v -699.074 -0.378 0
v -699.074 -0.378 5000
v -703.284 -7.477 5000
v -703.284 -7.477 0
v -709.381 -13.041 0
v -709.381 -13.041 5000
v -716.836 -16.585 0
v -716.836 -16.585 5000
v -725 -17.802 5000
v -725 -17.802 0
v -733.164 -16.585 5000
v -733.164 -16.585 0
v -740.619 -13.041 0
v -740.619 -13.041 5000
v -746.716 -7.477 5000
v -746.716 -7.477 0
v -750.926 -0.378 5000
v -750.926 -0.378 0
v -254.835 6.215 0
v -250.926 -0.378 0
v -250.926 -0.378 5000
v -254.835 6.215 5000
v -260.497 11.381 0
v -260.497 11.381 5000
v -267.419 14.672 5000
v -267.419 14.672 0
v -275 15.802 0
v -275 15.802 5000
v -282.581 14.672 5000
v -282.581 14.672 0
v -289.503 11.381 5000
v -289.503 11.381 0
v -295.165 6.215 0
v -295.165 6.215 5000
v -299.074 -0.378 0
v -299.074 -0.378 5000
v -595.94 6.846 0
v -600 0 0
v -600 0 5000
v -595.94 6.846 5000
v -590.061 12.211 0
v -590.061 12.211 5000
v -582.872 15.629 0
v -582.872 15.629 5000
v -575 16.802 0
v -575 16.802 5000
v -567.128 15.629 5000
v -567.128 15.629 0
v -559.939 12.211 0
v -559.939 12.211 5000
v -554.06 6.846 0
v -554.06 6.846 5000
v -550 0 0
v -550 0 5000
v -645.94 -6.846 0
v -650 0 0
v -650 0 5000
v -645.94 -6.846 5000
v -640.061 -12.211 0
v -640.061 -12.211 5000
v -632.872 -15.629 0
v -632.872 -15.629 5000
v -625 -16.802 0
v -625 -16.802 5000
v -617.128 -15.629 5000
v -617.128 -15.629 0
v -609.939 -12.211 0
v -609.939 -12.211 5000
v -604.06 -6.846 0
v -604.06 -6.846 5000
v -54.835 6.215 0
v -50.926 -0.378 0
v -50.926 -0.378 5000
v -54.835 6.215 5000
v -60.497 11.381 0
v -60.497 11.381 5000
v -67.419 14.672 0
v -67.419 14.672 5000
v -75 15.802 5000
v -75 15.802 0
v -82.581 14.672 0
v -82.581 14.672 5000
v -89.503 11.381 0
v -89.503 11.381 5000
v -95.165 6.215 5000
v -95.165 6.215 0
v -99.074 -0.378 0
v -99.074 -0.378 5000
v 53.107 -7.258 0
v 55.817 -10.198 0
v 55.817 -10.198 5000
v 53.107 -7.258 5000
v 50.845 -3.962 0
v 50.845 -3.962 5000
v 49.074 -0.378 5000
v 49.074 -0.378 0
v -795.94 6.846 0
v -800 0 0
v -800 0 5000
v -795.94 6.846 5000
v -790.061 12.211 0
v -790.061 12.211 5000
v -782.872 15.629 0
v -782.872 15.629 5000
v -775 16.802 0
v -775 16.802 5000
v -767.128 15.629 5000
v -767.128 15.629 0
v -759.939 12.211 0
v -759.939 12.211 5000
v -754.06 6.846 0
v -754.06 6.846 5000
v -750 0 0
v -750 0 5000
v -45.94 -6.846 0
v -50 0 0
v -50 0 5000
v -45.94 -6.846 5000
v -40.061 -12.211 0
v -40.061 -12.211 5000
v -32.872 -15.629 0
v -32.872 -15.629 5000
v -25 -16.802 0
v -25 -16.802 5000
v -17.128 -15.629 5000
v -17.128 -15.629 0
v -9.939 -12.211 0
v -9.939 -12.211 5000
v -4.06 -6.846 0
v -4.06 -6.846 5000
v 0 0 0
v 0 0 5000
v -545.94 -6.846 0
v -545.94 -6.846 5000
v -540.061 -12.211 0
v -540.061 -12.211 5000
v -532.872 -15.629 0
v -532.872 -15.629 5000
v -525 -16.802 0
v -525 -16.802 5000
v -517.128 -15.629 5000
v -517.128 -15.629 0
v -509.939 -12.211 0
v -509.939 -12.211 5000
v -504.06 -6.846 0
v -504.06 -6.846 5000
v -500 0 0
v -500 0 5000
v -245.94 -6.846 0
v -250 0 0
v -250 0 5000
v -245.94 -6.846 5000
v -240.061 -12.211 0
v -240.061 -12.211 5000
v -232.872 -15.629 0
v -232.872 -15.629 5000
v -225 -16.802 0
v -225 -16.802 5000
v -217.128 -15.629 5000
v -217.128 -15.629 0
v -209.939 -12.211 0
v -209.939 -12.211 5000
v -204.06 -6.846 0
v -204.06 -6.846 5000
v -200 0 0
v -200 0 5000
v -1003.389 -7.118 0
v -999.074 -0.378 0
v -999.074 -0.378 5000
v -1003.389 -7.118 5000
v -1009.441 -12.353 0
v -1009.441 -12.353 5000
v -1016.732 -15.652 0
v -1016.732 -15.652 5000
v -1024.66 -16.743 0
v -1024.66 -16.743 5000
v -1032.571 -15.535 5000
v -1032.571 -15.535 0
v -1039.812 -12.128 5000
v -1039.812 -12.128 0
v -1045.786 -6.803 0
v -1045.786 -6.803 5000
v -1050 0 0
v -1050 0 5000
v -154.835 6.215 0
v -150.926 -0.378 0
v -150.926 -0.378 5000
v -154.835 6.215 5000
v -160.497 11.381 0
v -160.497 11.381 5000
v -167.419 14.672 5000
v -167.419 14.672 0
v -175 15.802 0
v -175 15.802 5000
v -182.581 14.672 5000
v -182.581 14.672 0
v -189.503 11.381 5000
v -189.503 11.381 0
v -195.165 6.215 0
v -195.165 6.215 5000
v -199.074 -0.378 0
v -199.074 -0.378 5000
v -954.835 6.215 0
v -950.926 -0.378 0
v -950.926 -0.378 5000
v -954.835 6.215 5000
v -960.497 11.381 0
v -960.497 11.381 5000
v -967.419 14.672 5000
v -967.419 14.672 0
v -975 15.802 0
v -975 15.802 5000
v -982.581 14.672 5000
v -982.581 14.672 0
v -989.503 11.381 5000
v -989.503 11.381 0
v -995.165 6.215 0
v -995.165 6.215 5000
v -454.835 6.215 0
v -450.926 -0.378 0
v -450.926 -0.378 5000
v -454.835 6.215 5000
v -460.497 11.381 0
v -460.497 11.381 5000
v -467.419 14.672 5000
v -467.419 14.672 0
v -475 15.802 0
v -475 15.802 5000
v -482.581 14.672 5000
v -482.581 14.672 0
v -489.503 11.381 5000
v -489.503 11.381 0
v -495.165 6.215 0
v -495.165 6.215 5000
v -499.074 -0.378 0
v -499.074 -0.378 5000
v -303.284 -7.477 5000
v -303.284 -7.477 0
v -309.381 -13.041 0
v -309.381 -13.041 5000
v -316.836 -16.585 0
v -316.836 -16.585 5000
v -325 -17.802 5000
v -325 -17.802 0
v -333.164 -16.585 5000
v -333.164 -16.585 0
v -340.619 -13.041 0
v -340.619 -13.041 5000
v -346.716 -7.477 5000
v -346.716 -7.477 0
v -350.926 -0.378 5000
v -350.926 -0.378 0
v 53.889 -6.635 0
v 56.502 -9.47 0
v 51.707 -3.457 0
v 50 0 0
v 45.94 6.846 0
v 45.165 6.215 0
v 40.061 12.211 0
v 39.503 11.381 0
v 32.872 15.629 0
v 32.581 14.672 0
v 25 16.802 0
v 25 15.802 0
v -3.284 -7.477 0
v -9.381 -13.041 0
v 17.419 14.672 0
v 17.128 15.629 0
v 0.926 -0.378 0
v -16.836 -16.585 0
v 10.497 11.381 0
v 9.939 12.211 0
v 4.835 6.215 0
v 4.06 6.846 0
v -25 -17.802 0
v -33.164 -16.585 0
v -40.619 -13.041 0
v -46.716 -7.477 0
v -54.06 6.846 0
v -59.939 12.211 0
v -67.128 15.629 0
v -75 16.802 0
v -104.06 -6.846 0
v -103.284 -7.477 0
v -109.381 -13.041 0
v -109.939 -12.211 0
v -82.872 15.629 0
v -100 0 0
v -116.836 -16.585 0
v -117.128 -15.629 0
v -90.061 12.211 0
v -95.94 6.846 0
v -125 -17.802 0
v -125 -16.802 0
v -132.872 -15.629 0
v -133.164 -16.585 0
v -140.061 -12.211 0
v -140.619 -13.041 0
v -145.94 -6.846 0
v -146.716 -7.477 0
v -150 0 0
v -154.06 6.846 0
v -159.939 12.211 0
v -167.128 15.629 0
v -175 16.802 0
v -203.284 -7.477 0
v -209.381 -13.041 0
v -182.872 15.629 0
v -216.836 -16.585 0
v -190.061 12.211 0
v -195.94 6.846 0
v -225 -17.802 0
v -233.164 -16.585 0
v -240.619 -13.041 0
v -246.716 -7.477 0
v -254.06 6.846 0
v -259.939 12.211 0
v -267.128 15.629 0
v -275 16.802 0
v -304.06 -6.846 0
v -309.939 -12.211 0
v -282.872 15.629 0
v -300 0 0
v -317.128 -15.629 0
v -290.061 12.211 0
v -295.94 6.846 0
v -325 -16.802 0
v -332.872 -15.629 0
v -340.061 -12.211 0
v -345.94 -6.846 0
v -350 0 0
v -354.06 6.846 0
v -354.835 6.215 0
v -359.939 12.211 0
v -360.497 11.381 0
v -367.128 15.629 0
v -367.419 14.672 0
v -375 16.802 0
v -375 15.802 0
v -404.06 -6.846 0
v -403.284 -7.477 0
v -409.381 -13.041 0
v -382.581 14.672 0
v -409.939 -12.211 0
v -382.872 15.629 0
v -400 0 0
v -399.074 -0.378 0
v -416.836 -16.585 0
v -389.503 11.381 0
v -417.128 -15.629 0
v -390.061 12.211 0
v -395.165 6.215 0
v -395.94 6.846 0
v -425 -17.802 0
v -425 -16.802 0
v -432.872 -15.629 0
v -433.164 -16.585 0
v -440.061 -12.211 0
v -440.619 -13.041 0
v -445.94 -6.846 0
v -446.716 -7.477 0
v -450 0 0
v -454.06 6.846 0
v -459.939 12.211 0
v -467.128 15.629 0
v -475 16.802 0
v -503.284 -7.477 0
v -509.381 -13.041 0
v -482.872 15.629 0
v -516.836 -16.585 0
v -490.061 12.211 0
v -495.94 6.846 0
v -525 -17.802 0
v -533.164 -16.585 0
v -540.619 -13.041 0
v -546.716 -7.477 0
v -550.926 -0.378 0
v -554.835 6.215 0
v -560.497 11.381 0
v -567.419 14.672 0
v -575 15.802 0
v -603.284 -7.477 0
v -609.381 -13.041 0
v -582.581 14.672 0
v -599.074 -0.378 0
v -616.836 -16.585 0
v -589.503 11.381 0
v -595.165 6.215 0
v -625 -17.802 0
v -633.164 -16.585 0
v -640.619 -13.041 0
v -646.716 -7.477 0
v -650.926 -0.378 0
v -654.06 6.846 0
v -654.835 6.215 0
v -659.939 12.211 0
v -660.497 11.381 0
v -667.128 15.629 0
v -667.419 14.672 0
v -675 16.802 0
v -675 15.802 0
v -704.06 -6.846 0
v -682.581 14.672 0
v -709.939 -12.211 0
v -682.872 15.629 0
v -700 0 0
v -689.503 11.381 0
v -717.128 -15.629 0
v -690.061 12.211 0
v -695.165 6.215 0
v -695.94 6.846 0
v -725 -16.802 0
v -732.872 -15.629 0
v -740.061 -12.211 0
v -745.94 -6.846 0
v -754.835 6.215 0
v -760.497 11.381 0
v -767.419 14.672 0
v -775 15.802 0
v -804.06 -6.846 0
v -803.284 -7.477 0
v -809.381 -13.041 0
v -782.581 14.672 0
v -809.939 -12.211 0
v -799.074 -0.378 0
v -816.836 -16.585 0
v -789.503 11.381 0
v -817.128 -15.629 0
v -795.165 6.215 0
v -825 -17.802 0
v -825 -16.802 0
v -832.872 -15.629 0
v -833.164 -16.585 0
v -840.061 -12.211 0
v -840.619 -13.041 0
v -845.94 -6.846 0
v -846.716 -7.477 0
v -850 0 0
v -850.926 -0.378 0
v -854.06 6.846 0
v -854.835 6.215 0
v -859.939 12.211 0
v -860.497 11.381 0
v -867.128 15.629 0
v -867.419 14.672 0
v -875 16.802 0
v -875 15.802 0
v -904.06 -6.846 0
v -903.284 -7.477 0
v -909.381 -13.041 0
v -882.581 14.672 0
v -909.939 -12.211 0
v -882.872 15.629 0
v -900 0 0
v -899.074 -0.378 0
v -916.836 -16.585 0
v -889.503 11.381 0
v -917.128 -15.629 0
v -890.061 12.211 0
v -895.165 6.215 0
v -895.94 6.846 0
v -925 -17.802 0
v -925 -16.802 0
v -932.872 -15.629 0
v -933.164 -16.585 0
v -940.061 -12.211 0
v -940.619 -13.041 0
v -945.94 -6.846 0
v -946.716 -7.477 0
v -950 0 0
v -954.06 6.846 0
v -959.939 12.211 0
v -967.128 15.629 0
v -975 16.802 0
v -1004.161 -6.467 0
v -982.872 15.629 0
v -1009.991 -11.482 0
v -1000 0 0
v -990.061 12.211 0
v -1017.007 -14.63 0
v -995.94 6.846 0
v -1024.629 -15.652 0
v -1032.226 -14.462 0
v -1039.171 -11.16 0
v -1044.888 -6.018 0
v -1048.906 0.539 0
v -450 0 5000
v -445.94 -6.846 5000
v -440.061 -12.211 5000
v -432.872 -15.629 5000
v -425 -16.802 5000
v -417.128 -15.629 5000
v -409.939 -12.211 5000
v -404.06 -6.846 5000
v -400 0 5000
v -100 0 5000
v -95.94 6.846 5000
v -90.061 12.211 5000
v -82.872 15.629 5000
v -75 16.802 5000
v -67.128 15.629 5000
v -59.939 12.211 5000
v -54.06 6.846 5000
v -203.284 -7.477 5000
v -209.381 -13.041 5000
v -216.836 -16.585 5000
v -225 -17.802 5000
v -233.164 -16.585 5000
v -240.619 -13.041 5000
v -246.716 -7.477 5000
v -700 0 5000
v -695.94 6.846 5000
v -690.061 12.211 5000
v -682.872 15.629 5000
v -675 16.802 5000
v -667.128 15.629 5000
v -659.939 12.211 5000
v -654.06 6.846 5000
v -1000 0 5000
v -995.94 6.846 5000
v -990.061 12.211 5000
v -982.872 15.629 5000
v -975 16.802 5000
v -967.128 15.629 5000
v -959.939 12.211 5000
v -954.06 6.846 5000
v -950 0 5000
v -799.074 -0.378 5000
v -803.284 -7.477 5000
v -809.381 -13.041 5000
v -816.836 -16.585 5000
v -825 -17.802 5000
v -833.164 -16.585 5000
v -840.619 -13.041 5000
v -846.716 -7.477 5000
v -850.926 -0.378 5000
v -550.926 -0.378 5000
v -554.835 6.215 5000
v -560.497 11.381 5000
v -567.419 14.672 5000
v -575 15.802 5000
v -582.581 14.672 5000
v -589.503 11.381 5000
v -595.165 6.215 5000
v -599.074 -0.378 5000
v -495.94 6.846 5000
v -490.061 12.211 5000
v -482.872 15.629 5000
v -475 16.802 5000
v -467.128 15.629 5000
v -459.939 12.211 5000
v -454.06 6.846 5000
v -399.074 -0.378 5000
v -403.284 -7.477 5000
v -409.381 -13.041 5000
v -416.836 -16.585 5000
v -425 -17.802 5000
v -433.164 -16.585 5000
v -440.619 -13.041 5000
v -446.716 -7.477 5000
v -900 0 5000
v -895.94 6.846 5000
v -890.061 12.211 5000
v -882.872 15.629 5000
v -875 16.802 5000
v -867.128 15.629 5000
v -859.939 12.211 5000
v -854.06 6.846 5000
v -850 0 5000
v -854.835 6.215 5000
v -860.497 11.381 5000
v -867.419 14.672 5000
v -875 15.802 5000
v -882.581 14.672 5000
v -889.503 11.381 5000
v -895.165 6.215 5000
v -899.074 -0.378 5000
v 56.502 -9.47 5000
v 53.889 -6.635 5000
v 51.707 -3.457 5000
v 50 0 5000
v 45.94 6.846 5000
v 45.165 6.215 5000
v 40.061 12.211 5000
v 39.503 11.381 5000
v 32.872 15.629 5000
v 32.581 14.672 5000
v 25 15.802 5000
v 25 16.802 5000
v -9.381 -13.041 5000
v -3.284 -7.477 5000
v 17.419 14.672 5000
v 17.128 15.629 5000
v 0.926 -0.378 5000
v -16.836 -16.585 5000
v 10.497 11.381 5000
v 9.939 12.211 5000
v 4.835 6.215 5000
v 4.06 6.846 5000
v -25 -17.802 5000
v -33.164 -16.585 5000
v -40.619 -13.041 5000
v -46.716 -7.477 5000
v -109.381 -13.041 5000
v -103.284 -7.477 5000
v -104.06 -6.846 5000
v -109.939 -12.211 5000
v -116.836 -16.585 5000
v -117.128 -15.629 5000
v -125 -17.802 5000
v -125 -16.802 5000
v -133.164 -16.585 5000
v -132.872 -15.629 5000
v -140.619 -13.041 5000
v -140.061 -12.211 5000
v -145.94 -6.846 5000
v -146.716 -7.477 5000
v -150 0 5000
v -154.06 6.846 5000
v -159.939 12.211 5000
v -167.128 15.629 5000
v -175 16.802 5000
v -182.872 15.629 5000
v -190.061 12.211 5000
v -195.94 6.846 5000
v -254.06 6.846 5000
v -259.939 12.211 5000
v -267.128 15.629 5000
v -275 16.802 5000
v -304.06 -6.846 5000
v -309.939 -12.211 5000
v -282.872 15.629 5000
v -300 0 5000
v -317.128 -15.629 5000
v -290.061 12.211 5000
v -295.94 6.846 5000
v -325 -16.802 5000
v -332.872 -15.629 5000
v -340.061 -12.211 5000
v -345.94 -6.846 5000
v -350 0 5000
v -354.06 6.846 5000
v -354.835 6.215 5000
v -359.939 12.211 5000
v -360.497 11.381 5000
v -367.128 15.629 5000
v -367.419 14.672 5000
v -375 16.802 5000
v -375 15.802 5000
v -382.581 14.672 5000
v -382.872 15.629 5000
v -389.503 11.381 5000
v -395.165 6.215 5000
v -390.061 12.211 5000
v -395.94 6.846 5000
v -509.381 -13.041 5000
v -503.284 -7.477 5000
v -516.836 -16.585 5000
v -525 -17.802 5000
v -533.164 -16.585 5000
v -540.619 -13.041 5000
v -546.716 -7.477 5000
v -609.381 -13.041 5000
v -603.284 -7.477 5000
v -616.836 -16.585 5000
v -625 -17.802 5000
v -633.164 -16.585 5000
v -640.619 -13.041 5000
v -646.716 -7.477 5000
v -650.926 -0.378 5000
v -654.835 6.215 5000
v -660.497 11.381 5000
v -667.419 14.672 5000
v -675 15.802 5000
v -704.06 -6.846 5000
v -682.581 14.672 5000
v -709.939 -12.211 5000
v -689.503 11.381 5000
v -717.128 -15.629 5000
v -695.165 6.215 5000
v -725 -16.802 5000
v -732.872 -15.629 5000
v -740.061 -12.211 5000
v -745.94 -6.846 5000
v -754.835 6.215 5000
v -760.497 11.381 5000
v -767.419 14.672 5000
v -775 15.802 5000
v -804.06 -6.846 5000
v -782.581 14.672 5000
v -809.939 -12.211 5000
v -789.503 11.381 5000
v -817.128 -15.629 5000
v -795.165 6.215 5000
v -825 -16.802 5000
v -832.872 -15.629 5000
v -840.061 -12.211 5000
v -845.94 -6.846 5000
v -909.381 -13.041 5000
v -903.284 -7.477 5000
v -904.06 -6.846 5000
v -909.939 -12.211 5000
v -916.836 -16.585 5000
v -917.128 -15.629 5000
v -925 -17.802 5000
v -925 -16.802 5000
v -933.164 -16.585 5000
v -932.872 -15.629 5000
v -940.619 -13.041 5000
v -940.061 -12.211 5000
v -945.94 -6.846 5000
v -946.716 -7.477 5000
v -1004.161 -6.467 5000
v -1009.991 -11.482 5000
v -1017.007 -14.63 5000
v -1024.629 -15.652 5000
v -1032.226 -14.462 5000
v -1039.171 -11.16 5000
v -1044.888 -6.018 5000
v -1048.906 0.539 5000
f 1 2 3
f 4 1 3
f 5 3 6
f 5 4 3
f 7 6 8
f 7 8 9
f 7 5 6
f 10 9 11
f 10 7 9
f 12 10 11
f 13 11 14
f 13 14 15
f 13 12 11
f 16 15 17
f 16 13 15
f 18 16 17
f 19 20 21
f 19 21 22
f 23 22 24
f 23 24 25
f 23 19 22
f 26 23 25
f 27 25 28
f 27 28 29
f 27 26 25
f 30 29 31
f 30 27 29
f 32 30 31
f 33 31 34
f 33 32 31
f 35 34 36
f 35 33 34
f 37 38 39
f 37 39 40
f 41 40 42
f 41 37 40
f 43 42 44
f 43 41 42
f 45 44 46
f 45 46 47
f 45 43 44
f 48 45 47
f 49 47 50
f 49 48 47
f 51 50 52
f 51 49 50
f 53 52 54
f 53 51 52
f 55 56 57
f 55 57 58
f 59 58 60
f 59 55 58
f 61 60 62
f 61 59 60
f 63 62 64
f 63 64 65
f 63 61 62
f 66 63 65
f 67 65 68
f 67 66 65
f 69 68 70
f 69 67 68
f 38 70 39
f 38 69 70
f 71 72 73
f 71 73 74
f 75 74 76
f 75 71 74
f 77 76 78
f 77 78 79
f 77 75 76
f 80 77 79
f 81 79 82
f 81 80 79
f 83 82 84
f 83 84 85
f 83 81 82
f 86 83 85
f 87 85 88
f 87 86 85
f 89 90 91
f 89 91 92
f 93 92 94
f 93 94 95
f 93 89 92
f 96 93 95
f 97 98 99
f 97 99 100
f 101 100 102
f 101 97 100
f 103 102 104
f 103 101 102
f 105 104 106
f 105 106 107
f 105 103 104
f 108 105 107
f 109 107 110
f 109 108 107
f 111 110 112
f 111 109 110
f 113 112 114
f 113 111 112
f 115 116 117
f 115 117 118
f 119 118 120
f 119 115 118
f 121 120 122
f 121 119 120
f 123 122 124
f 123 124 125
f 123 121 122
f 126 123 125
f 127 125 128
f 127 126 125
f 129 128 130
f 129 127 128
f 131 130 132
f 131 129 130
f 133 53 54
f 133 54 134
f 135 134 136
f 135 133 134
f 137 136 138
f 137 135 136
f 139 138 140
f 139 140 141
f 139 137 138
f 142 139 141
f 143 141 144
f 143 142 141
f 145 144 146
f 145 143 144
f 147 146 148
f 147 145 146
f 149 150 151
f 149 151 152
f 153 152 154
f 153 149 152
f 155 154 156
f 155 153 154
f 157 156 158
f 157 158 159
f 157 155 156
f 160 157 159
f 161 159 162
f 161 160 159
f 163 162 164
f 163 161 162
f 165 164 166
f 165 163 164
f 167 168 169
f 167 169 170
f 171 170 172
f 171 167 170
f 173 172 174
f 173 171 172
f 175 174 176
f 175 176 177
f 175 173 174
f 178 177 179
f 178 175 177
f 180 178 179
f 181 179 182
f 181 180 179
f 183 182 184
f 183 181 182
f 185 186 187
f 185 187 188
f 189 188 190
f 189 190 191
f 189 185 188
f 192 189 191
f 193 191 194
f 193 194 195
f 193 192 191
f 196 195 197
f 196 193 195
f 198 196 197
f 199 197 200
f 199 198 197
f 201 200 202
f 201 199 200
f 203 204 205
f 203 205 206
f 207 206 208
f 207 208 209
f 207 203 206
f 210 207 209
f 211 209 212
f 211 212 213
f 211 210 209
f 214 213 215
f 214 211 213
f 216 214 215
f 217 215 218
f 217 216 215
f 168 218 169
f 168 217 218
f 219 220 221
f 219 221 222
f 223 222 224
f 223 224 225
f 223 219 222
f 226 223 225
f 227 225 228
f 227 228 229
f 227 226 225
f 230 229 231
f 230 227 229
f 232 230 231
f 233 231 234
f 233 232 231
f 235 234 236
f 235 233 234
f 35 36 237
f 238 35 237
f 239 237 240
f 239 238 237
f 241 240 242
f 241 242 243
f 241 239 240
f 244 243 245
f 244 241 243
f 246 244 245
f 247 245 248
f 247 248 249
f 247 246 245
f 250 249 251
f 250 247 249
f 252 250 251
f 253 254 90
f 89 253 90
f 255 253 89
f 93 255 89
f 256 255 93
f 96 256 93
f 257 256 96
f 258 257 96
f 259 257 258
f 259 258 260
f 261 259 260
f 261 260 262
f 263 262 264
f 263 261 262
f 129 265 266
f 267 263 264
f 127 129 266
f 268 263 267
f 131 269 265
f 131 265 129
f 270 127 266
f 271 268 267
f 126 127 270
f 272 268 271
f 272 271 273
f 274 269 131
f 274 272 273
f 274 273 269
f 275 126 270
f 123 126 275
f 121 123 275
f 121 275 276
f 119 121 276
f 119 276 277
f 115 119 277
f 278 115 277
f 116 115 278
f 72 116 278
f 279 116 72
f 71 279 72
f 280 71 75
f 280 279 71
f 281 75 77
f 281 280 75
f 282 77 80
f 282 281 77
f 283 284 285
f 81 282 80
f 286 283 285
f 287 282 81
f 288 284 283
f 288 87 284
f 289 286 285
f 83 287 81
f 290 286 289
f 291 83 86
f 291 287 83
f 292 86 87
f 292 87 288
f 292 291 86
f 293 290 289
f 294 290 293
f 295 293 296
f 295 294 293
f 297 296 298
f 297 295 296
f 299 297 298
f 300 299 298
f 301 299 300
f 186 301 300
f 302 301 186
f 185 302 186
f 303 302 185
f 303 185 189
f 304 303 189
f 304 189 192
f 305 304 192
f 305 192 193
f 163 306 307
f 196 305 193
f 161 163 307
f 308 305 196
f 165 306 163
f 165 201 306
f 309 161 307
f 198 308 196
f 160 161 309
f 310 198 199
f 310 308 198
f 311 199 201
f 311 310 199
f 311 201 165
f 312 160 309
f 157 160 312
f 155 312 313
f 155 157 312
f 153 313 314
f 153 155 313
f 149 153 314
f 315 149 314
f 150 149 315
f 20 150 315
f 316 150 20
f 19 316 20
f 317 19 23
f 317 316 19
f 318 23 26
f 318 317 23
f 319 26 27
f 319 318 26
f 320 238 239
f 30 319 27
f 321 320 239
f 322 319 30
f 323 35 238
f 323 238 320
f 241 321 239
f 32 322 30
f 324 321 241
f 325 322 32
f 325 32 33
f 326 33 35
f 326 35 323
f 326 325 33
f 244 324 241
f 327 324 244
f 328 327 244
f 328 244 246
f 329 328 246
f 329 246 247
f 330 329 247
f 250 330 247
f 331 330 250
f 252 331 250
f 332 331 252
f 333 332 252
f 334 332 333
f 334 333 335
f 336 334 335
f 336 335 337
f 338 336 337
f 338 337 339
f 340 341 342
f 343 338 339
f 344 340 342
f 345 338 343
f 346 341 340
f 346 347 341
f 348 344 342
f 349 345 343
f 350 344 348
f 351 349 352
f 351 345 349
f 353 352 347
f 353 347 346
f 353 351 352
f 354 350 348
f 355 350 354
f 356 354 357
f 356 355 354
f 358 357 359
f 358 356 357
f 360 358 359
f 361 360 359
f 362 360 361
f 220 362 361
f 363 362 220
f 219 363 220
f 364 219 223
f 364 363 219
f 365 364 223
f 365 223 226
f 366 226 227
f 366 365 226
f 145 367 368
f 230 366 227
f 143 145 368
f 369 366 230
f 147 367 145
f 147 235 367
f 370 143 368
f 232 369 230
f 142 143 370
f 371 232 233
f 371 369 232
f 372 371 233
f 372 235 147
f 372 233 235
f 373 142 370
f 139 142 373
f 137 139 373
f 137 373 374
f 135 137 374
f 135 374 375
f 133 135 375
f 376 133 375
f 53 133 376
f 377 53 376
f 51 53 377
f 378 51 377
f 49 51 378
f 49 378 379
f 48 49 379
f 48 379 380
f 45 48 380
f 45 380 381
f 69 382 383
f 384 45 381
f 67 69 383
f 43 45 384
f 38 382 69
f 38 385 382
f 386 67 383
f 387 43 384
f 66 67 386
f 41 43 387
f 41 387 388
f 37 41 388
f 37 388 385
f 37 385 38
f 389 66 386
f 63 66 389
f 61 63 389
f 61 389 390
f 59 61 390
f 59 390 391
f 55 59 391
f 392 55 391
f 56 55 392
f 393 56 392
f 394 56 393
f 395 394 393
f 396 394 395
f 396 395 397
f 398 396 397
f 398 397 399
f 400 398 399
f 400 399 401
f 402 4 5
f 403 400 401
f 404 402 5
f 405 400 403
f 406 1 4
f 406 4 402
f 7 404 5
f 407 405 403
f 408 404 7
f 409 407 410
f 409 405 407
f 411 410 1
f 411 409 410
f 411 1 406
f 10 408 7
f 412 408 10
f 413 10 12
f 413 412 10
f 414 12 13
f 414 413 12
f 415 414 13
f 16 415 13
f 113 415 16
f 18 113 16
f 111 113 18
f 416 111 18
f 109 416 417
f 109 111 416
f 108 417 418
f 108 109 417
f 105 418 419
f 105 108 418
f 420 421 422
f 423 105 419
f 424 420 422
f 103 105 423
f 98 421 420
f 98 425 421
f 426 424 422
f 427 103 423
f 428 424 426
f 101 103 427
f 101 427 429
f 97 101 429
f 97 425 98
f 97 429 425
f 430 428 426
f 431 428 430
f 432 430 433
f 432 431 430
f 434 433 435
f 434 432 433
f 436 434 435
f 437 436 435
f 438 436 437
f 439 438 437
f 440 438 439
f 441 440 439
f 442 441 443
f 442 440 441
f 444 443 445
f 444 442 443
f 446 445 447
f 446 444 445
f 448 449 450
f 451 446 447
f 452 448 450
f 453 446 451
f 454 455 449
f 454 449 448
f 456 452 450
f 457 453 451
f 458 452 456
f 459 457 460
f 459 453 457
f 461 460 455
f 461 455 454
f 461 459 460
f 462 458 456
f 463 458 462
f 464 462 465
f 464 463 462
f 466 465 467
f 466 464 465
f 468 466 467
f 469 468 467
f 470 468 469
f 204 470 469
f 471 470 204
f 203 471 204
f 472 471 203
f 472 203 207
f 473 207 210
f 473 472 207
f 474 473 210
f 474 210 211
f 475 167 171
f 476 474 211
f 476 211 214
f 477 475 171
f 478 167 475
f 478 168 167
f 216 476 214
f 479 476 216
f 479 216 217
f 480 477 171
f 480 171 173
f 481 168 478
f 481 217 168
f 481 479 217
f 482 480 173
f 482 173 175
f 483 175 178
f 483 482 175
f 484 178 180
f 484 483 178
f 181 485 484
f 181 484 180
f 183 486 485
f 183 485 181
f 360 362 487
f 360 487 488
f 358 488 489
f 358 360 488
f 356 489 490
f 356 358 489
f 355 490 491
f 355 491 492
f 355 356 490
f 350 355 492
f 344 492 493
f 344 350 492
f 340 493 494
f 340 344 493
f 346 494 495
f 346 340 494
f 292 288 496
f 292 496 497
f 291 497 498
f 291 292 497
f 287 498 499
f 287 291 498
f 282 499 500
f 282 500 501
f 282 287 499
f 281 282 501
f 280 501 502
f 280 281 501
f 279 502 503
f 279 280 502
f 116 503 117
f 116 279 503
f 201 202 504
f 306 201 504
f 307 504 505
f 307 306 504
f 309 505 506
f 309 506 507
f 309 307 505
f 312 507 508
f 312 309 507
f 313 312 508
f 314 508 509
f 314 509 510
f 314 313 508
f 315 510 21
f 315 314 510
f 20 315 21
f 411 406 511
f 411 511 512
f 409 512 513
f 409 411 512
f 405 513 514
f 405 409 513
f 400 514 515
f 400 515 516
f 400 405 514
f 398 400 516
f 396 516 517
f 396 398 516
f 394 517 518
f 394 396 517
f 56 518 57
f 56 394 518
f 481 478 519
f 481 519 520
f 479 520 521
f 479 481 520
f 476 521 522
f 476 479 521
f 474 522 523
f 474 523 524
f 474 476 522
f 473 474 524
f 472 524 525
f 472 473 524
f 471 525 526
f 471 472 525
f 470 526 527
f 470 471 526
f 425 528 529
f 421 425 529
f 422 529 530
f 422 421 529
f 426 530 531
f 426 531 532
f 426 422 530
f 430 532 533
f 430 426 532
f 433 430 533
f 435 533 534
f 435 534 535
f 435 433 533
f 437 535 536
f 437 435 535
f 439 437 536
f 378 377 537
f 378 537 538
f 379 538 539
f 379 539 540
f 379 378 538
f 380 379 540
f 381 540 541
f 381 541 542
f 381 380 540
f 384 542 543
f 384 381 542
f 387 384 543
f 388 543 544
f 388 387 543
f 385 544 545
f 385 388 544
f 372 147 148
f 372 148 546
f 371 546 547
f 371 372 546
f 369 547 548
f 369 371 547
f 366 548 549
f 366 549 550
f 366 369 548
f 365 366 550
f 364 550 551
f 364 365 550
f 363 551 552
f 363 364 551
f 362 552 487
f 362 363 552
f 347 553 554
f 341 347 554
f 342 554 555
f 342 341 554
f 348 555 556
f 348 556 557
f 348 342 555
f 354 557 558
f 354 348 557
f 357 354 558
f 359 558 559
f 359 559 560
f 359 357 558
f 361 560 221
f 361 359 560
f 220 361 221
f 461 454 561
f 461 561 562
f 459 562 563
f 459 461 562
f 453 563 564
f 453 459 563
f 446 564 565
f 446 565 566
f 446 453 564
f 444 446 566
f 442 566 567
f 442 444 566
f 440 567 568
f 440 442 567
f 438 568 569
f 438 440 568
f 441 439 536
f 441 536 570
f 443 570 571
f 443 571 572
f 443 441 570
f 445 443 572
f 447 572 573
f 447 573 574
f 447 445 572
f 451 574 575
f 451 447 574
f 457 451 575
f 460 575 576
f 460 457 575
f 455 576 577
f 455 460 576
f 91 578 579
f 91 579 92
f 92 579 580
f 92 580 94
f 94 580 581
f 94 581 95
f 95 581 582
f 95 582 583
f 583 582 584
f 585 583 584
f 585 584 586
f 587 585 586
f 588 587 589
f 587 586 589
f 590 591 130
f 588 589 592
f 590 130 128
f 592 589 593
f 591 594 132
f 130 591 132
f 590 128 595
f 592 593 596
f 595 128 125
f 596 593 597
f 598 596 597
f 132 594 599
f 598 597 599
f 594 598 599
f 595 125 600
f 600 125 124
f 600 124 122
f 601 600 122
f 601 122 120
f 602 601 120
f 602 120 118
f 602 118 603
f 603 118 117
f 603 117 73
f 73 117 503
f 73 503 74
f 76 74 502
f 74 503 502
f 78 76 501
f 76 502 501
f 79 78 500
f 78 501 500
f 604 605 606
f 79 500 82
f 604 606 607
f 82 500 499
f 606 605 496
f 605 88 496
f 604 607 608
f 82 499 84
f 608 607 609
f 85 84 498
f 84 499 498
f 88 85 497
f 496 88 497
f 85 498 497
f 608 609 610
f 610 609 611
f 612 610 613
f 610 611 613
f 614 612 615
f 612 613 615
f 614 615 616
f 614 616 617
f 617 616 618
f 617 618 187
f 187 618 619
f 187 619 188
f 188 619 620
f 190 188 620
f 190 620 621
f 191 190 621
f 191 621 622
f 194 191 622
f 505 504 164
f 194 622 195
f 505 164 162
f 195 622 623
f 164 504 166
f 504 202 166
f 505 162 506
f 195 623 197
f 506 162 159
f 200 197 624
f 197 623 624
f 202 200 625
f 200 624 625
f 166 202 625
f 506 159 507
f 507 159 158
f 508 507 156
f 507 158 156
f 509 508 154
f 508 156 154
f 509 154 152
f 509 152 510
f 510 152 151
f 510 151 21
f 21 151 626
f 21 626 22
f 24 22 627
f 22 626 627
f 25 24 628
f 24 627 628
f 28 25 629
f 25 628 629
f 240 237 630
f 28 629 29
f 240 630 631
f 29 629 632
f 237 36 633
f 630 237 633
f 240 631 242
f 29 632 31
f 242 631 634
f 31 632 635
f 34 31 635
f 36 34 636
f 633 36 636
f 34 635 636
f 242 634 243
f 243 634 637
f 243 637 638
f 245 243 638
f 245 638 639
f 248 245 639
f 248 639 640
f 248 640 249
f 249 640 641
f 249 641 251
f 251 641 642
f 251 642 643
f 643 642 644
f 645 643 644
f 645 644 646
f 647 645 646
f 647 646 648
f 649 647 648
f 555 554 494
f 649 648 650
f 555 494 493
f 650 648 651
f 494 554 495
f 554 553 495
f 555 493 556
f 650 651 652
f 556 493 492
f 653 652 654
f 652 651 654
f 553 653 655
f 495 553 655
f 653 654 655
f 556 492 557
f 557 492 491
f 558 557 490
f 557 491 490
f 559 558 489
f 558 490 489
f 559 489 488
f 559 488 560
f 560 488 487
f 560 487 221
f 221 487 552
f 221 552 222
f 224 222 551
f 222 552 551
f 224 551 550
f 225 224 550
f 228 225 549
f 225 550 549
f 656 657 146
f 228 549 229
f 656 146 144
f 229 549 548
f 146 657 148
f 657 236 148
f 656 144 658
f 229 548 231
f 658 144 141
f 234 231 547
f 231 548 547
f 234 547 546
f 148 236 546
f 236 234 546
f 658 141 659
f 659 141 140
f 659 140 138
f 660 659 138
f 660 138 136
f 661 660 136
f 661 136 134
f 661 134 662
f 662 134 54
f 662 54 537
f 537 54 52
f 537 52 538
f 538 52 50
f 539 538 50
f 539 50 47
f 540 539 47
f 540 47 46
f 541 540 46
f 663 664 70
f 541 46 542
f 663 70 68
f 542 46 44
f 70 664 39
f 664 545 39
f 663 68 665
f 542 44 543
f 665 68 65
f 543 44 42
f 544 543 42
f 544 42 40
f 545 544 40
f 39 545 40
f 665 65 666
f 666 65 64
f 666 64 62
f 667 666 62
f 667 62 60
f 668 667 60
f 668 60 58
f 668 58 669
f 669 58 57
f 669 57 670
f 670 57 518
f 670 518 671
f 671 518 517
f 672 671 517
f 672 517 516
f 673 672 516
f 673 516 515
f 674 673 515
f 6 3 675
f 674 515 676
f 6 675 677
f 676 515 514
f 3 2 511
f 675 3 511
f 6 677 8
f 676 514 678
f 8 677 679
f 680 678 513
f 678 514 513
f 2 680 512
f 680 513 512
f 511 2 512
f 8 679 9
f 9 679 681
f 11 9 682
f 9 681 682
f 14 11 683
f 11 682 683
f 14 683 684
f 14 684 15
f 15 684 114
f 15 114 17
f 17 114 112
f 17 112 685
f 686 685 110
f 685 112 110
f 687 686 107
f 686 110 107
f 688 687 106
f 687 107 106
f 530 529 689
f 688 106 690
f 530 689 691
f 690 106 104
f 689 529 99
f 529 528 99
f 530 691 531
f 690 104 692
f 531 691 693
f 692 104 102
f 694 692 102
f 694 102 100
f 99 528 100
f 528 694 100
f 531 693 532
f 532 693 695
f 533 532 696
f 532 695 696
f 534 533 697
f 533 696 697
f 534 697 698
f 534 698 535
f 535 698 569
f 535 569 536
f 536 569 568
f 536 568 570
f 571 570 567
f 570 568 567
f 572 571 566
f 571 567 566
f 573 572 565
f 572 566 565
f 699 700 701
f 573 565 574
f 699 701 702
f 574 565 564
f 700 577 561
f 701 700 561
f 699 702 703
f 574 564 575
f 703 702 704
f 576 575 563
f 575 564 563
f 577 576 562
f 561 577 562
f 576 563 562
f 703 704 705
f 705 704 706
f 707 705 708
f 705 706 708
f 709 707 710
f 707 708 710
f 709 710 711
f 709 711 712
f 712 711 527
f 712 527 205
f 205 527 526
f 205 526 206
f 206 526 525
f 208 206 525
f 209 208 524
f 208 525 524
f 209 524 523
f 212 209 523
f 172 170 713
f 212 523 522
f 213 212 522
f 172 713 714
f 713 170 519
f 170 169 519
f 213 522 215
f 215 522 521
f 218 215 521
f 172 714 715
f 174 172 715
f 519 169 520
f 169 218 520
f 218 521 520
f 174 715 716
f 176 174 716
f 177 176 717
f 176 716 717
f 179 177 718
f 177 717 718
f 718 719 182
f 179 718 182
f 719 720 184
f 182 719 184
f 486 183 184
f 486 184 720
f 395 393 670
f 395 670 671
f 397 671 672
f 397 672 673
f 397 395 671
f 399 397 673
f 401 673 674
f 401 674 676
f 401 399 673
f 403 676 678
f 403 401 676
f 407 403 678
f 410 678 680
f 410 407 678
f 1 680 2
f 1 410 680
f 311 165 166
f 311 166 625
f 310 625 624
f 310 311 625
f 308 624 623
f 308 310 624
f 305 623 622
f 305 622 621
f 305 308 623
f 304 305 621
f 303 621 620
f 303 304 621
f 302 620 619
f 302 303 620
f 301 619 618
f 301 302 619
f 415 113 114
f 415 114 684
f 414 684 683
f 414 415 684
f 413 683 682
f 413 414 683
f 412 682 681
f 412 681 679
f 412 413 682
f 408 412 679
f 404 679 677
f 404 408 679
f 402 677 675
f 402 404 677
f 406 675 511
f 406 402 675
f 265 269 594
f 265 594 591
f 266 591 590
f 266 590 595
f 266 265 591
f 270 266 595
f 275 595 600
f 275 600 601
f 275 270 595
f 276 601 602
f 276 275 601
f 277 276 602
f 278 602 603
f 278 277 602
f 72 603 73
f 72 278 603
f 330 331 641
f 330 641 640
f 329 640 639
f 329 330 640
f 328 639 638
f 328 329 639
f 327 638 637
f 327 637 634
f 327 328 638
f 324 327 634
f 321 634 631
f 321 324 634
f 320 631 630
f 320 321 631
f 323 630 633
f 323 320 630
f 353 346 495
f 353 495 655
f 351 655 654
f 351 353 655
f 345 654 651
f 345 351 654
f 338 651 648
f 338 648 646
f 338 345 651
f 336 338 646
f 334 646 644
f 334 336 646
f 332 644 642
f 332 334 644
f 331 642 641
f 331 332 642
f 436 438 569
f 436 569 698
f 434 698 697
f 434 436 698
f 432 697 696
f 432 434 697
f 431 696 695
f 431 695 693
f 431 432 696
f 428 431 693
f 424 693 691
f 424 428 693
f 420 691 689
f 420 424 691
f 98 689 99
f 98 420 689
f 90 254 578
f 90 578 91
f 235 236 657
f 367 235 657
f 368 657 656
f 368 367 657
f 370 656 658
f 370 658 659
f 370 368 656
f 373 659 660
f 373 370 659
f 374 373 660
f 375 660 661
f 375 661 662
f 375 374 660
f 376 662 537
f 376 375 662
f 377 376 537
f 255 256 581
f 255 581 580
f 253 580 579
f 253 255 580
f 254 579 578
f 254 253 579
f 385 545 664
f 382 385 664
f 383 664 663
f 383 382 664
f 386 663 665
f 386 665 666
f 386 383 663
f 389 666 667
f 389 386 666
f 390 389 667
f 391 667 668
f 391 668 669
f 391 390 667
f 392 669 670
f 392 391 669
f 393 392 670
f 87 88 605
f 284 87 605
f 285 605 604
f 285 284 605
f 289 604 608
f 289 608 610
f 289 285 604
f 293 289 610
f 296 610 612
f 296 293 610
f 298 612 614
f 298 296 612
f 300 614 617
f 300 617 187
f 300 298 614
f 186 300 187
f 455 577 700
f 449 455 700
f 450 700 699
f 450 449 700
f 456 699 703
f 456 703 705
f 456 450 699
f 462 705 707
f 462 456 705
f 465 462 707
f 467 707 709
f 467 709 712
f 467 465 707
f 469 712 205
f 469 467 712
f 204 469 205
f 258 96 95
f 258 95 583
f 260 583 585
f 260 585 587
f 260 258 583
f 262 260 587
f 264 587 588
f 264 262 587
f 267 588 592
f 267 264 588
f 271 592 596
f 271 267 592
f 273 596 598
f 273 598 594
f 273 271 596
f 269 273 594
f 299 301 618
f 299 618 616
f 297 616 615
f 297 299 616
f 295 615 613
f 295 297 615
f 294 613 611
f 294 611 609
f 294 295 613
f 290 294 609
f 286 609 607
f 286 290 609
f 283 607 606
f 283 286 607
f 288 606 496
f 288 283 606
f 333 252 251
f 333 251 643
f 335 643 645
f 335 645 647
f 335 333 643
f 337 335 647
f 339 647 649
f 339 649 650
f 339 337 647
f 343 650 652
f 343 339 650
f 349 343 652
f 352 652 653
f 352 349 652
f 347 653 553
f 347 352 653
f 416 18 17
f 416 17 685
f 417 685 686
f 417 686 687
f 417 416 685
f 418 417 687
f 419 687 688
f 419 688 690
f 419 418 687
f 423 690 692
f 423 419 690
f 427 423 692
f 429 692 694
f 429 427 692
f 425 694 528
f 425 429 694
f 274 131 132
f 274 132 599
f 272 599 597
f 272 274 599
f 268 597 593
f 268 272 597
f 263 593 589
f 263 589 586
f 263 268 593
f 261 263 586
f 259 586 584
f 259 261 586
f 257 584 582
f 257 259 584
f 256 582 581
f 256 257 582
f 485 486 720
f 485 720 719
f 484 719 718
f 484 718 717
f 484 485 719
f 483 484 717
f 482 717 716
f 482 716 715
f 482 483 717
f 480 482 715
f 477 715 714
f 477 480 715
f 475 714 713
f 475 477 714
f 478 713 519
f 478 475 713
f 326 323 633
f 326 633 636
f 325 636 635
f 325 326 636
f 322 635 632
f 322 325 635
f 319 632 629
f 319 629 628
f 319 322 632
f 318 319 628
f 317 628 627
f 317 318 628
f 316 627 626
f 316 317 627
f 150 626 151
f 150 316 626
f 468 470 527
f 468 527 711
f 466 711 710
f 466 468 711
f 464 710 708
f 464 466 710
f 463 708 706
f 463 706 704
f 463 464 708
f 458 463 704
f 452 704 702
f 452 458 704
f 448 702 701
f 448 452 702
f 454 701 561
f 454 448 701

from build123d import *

# Parameters (mm, degrees)
RESSALTO_EXTRUS_O1_DEPTH = 5000


with BuildPart() as part:
    # Esboço1 → Ressalto-extrusão1 (new body)
    with BuildSketch(Plane.XY):
        with BuildLine():
            Line((-1050, 0), (-1048.906264859, 0.539317413))
            ThreePointArc((-1048.906264859, 0.539317413), (-1024.628710002, -15.652028698), (-1000, 0))
            ThreePointArc((-1000, 0), (-975, 16.801960973), (-950, 0))
            ThreePointArc((-950, 0), (-925, -16.801960973), (-900, 0))
            ThreePointArc((-900, 0), (-875, 16.801960973), (-850, 0))
            ThreePointArc((-850, 0), (-825, -16.801960973), (-800, 0))
            ThreePointArc((-800, 0), (-775, 16.801960973), (-750, 0))
            ThreePointArc((-750, 0), (-725, -16.801960973), (-700, 0))
            ThreePointArc((-700, 0), (-675, 16.801960973), (-650, 0))
            ThreePointArc((-650, 0), (-625, -16.801960973), (-600, 0))
            ThreePointArc((-600, 0), (-575, 16.801960973), (-550, 0))
            ThreePointArc((-550, 0), (-525, -16.801960973), (-500, 0))
            ThreePointArc((-500, 0), (-475, 16.801960973), (-450, 0))
            ThreePointArc((-450, 0), (-425, -16.801960973), (-400, 0))
            ThreePointArc((-400, 0), (-375, 16.801960973), (-350, 0))
            ThreePointArc((-350, 0), (-325, -16.801960973), (-300, 0))
            ThreePointArc((-300, 0), (-275, 16.801960973), (-250, 0))
            ThreePointArc((-250, 0), (-225, -16.801960973), (-200, 0))
            ThreePointArc((-200, 0), (-175, 16.801960973), (-150, 0))
            ThreePointArc((-150, 0), (-125, -16.801960973), (-100, 0))
            ThreePointArc((-100, 0), (-75, 16.801960973), (-50, 0))
            ThreePointArc((-50, 0), (-25, -16.801960973), (0, 0))
            ThreePointArc((0, 0), (25, 16.801960973), (50, 0))
            ThreePointArc((50, 0), (52.741476306, -5.084569487), (56.501792696, -9.469607668))
            Line((56.501792696, -9.469607668), (55.816673907, -10.198039027))
            ThreePointArc((55.816673907, -10.198039027), (51.91708654, -5.650592024), (49.074074074, -0.377705149))
            ThreePointArc((49.074074074, -0.377705149), (25, 15.801960973), (0.925925926, -0.377705149))
            ThreePointArc((0.925925926, -0.377705149), (-25, -17.801960973), (-50.925925926, -0.377705149))
            ThreePointArc((-50.925925926, -0.377705149), (-75, 15.801960973), (-99.074074074, -0.377705149))
            ThreePointArc((-99.074074074, -0.377705149), (-125, -17.801960973), (-150.925925926, -0.377705149))
            ThreePointArc((-150.925925926, -0.377705149), (-175, 15.801960973), (-199.074074074, -0.377705149))
            ThreePointArc((-199.074074074, -0.377705149), (-225, -17.801960973), (-250.925925926, -0.377705149))
            ThreePointArc((-250.925925926, -0.377705149), (-275, 15.801960973), (-299.074074074, -0.377705149))
            ThreePointArc((-299.074074074, -0.377705149), (-325, -17.801960973), (-350.925925926, -0.377705149))
            ThreePointArc((-350.925925926, -0.377705149), (-375, 15.801960973), (-399.074074074, -0.377705149))
            ThreePointArc((-399.074074074, -0.377705149), (-425, -17.801960973), (-450.925925926, -0.377705149))
            ThreePointArc((-450.925925926, -0.377705149), (-475, 15.801960973), (-499.074074074, -0.377705149))
            ThreePointArc((-499.074074074, -0.377705149), (-525, -17.801960973), (-550.925925926, -0.377705149))
            ThreePointArc((-550.925925926, -0.377705149), (-575, 15.801960973), (-599.074074074, -0.377705149))
            ThreePointArc((-599.074074074, -0.377705149), (-625, -17.801960973), (-650.925925926, -0.377705149))
            ThreePointArc((-650.925925926, -0.377705149), (-675, 15.801960973), (-699.074074074, -0.377705149))
            ThreePointArc((-699.074074074, -0.377705149), (-725, -17.801960973), (-750.925925926, -0.377705149))
            ThreePointArc((-750.925925926, -0.377705149), (-775, 15.801960973), (-799.074074074, -0.377705149))
            ThreePointArc((-799.074074074, -0.377705149), (-825, -17.801960973), (-850.925925926, -0.377705149))
            ThreePointArc((-850.925925926, -0.377705149), (-875, 15.801960973), (-899.074074074, -0.377705149))
            ThreePointArc((-899.074074074, -0.377705149), (-925, -17.801960973), (-950.925925926, -0.377705149))
            ThreePointArc((-950.925925926, -0.377705149), (-975, 15.801960973), (-999.074074074, -0.377705149))
            ThreePointArc((-999.074074074, -0.377705149), (-1024.659813644, -16.74280323), (-1050, 0))
        make_face()
    extrude(amount=RESSALTO_EXTRUS_O1_DEPTH)


solid = part.part
